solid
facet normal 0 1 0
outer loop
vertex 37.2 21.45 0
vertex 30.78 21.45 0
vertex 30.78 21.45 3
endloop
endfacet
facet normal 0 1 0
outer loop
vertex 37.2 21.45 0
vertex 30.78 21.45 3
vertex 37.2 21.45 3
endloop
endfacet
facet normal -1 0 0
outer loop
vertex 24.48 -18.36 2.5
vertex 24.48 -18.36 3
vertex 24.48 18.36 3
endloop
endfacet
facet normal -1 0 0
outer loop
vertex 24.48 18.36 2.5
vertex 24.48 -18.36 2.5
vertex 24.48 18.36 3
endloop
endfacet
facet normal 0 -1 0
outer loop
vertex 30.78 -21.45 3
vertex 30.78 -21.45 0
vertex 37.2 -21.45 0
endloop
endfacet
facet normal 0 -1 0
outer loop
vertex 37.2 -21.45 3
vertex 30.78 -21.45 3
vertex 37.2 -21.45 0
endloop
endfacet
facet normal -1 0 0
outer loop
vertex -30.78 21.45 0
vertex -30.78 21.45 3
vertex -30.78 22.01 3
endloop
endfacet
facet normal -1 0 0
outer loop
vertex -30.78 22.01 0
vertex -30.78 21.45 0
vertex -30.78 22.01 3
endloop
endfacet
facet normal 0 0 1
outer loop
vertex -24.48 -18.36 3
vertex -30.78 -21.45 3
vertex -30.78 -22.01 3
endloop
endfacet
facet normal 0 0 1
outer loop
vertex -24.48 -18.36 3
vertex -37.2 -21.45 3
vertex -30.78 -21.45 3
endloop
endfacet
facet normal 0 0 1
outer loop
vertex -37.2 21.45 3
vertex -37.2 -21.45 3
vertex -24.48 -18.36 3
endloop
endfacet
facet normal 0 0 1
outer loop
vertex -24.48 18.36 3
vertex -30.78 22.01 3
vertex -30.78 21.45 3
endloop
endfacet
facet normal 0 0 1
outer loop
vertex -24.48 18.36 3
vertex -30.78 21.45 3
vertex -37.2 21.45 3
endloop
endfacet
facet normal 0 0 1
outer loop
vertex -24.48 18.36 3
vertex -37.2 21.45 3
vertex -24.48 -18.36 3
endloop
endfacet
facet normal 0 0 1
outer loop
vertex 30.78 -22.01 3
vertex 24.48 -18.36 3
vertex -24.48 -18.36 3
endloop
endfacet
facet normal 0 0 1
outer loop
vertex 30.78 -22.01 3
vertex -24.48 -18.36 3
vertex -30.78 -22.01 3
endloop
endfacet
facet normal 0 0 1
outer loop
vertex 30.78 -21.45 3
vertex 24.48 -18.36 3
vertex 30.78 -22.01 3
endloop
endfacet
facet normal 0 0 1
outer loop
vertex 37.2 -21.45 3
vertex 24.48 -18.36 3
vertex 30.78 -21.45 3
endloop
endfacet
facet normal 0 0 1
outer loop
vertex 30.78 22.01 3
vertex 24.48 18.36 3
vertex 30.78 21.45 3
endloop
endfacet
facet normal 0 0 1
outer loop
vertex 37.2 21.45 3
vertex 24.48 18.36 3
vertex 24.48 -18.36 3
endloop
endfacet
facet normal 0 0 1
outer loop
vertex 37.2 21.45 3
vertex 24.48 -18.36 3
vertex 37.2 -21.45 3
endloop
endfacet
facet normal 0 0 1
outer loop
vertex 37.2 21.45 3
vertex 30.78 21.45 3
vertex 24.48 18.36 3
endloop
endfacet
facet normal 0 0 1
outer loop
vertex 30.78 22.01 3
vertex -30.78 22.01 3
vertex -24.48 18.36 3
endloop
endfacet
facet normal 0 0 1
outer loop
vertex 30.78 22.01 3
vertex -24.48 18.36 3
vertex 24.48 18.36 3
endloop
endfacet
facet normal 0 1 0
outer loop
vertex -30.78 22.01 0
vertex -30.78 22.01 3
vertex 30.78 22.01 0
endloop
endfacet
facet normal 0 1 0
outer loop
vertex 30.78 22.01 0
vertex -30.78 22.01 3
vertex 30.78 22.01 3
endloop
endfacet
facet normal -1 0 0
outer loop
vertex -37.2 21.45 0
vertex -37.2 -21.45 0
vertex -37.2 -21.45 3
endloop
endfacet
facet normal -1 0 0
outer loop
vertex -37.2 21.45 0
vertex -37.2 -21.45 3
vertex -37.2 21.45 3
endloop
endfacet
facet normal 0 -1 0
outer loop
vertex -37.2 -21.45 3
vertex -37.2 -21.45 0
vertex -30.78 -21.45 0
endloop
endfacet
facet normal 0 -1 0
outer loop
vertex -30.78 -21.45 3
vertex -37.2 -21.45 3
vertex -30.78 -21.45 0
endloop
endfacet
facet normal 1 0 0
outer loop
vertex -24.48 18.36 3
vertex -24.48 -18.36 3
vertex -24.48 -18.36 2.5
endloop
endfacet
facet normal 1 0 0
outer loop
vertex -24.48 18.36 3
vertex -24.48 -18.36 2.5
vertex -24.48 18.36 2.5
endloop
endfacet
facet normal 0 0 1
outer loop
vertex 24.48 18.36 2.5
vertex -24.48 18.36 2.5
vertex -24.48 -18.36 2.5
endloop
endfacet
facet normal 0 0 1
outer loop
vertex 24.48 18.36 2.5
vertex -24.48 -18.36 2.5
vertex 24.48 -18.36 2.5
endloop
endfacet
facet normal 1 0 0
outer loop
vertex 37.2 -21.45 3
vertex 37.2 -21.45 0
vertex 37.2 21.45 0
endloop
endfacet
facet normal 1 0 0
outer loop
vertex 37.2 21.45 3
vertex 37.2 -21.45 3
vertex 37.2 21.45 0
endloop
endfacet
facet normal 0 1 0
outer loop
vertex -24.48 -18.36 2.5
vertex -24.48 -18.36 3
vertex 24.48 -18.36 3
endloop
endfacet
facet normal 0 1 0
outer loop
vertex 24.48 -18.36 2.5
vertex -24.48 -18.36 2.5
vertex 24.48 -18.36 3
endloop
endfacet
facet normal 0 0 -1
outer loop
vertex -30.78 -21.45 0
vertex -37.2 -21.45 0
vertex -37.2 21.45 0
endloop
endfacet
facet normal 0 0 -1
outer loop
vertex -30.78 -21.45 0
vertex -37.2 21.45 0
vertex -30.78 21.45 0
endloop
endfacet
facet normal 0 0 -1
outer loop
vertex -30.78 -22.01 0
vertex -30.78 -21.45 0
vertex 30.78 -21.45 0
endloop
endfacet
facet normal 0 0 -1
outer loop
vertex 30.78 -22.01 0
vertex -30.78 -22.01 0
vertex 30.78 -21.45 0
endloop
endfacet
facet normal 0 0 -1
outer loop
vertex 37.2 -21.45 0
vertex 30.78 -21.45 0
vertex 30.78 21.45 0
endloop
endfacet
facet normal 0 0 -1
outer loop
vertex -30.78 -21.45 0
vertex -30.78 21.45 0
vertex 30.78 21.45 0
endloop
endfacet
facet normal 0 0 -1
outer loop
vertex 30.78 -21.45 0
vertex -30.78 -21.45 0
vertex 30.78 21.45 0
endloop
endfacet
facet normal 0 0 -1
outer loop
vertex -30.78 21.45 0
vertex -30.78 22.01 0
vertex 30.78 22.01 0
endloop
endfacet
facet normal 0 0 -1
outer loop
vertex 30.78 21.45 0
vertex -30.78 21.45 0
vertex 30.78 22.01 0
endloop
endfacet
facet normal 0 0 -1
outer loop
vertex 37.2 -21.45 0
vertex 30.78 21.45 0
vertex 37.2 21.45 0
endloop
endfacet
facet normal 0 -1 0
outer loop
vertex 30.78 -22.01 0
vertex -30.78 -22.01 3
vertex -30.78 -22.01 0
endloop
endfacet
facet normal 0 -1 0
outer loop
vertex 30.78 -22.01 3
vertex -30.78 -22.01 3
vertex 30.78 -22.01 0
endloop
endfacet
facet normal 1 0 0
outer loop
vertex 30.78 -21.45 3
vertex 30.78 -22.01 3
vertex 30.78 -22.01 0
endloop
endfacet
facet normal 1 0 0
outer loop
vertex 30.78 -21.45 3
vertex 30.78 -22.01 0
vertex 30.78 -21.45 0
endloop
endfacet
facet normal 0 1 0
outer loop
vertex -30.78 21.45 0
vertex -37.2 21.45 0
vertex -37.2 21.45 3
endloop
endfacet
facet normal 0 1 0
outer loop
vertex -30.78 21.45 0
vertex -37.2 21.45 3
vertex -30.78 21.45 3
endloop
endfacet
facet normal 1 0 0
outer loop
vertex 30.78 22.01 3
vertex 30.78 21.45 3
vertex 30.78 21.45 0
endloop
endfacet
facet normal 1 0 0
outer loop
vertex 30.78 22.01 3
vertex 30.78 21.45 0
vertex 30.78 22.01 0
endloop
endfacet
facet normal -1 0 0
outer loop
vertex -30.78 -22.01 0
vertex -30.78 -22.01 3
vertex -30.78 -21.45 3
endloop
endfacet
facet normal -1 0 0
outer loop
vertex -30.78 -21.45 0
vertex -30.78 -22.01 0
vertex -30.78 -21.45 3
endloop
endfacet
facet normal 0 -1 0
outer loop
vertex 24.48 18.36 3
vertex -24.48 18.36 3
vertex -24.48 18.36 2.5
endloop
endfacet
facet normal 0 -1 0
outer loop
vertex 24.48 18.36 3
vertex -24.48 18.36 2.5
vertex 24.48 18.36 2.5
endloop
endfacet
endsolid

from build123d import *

# Parameters (mm, degrees)
SKETCH_1_W          = 74.4
SKETCH_1_H          = 42.9
EXTRUDE_1_DEPTH     = 3
SKETCH_2_W          = 61.56
SKETCH_2_H          = 44.02
EXTRUDE_2_DEPTH     = 3
SKETCH_3_W          = 48.96
SKETCH_3_H          = 36.72
CUT_EXTRUDE_2_DEPTH = 0.5


with BuildPart() as part:
    # 草图1 → 凸台-拉伸1 (new body)
    with BuildSketch(Plane.XY):
        Rectangle(SKETCH_1_W, SKETCH_1_H)
    extrude(amount=EXTRUDE_1_DEPTH)

    # 草图2 → 凸台-拉伸2 (add)
    with BuildSketch(Plane.XY.offset(3)):
        Rectangle(SKETCH_2_W, SKETCH_2_H)
    extrude(amount=-EXTRUDE_2_DEPTH)

    # 草图3 → 切除-拉伸2 (cut)
    with BuildSketch(Plane.XY.offset(3)):
        Rectangle(SKETCH_3_W, SKETCH_3_H)
    extrude(amount=-CUT_EXTRUDE_2_DEPTH, mode=Mode.SUBTRACT)


solid = part.part
